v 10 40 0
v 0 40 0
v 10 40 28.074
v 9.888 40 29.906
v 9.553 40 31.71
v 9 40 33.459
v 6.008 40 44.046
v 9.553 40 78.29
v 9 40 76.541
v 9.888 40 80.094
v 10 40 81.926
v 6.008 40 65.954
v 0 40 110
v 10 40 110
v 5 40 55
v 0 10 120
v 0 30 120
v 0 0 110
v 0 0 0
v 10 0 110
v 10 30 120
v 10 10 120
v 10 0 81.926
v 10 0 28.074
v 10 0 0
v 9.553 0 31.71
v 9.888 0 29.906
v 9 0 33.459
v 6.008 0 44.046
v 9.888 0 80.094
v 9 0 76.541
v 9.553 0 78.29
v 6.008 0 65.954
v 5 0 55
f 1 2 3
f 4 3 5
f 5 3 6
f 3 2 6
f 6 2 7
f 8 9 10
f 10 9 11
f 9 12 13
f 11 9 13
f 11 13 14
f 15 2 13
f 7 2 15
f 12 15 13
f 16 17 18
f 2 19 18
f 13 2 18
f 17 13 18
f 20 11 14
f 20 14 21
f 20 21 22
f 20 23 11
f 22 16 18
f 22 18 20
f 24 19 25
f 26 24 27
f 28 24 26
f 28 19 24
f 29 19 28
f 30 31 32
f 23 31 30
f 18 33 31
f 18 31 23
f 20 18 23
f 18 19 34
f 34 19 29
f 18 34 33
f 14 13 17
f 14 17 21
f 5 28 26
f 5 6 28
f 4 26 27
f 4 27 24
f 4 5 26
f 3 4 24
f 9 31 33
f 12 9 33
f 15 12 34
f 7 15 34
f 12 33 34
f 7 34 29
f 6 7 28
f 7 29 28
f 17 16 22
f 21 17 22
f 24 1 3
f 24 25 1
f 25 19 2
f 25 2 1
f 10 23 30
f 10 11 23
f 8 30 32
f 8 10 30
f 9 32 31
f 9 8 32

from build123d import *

# Parameters (mm, degrees)
F0_W     = 10
F0_H     = 120
F1_DEPTH = 40
F2_SIZE  = 10
F4_DEPTH = 40
F5_R     = 15


with BuildPart() as f1:
    # F0 (on Front) → F1 (new body)
    with BuildSketch(Plane.XZ):
        with Locations((5, 60)):
            Rectangle(F0_W, F0_H)
    extrude(amount=-F1_DEPTH)

    # F2
    f2_edges = [f1.edges().sort_by_distance(p)[0] for p in [
        (5, 0, 120),
        (5, 40, 120),
    ]]
    chamfer(f2_edges, length=F2_SIZE)

    # F3 (on face) → F4 (cut, through all)
    with BuildSketch(Plane.XZ):
        with BuildLine():
            ThreePointArc((10, 78.97916), (4.9999989609, 55), (10, 31.02084))
            Line((10, 31.02084), (10, 78.97916))
        make_face()
    extrude(amount=-F4_DEPTH, mode=Mode.SUBTRACT)

    # F5
    f5_edges = [f1.edges().sort_by_distance(p)[0] for p in [
        (10, 20, 31.02084),
        (10, 20, 78.97916),
    ]]
    fillet(f5_edges, radius=F5_R)


solid = f1.part
